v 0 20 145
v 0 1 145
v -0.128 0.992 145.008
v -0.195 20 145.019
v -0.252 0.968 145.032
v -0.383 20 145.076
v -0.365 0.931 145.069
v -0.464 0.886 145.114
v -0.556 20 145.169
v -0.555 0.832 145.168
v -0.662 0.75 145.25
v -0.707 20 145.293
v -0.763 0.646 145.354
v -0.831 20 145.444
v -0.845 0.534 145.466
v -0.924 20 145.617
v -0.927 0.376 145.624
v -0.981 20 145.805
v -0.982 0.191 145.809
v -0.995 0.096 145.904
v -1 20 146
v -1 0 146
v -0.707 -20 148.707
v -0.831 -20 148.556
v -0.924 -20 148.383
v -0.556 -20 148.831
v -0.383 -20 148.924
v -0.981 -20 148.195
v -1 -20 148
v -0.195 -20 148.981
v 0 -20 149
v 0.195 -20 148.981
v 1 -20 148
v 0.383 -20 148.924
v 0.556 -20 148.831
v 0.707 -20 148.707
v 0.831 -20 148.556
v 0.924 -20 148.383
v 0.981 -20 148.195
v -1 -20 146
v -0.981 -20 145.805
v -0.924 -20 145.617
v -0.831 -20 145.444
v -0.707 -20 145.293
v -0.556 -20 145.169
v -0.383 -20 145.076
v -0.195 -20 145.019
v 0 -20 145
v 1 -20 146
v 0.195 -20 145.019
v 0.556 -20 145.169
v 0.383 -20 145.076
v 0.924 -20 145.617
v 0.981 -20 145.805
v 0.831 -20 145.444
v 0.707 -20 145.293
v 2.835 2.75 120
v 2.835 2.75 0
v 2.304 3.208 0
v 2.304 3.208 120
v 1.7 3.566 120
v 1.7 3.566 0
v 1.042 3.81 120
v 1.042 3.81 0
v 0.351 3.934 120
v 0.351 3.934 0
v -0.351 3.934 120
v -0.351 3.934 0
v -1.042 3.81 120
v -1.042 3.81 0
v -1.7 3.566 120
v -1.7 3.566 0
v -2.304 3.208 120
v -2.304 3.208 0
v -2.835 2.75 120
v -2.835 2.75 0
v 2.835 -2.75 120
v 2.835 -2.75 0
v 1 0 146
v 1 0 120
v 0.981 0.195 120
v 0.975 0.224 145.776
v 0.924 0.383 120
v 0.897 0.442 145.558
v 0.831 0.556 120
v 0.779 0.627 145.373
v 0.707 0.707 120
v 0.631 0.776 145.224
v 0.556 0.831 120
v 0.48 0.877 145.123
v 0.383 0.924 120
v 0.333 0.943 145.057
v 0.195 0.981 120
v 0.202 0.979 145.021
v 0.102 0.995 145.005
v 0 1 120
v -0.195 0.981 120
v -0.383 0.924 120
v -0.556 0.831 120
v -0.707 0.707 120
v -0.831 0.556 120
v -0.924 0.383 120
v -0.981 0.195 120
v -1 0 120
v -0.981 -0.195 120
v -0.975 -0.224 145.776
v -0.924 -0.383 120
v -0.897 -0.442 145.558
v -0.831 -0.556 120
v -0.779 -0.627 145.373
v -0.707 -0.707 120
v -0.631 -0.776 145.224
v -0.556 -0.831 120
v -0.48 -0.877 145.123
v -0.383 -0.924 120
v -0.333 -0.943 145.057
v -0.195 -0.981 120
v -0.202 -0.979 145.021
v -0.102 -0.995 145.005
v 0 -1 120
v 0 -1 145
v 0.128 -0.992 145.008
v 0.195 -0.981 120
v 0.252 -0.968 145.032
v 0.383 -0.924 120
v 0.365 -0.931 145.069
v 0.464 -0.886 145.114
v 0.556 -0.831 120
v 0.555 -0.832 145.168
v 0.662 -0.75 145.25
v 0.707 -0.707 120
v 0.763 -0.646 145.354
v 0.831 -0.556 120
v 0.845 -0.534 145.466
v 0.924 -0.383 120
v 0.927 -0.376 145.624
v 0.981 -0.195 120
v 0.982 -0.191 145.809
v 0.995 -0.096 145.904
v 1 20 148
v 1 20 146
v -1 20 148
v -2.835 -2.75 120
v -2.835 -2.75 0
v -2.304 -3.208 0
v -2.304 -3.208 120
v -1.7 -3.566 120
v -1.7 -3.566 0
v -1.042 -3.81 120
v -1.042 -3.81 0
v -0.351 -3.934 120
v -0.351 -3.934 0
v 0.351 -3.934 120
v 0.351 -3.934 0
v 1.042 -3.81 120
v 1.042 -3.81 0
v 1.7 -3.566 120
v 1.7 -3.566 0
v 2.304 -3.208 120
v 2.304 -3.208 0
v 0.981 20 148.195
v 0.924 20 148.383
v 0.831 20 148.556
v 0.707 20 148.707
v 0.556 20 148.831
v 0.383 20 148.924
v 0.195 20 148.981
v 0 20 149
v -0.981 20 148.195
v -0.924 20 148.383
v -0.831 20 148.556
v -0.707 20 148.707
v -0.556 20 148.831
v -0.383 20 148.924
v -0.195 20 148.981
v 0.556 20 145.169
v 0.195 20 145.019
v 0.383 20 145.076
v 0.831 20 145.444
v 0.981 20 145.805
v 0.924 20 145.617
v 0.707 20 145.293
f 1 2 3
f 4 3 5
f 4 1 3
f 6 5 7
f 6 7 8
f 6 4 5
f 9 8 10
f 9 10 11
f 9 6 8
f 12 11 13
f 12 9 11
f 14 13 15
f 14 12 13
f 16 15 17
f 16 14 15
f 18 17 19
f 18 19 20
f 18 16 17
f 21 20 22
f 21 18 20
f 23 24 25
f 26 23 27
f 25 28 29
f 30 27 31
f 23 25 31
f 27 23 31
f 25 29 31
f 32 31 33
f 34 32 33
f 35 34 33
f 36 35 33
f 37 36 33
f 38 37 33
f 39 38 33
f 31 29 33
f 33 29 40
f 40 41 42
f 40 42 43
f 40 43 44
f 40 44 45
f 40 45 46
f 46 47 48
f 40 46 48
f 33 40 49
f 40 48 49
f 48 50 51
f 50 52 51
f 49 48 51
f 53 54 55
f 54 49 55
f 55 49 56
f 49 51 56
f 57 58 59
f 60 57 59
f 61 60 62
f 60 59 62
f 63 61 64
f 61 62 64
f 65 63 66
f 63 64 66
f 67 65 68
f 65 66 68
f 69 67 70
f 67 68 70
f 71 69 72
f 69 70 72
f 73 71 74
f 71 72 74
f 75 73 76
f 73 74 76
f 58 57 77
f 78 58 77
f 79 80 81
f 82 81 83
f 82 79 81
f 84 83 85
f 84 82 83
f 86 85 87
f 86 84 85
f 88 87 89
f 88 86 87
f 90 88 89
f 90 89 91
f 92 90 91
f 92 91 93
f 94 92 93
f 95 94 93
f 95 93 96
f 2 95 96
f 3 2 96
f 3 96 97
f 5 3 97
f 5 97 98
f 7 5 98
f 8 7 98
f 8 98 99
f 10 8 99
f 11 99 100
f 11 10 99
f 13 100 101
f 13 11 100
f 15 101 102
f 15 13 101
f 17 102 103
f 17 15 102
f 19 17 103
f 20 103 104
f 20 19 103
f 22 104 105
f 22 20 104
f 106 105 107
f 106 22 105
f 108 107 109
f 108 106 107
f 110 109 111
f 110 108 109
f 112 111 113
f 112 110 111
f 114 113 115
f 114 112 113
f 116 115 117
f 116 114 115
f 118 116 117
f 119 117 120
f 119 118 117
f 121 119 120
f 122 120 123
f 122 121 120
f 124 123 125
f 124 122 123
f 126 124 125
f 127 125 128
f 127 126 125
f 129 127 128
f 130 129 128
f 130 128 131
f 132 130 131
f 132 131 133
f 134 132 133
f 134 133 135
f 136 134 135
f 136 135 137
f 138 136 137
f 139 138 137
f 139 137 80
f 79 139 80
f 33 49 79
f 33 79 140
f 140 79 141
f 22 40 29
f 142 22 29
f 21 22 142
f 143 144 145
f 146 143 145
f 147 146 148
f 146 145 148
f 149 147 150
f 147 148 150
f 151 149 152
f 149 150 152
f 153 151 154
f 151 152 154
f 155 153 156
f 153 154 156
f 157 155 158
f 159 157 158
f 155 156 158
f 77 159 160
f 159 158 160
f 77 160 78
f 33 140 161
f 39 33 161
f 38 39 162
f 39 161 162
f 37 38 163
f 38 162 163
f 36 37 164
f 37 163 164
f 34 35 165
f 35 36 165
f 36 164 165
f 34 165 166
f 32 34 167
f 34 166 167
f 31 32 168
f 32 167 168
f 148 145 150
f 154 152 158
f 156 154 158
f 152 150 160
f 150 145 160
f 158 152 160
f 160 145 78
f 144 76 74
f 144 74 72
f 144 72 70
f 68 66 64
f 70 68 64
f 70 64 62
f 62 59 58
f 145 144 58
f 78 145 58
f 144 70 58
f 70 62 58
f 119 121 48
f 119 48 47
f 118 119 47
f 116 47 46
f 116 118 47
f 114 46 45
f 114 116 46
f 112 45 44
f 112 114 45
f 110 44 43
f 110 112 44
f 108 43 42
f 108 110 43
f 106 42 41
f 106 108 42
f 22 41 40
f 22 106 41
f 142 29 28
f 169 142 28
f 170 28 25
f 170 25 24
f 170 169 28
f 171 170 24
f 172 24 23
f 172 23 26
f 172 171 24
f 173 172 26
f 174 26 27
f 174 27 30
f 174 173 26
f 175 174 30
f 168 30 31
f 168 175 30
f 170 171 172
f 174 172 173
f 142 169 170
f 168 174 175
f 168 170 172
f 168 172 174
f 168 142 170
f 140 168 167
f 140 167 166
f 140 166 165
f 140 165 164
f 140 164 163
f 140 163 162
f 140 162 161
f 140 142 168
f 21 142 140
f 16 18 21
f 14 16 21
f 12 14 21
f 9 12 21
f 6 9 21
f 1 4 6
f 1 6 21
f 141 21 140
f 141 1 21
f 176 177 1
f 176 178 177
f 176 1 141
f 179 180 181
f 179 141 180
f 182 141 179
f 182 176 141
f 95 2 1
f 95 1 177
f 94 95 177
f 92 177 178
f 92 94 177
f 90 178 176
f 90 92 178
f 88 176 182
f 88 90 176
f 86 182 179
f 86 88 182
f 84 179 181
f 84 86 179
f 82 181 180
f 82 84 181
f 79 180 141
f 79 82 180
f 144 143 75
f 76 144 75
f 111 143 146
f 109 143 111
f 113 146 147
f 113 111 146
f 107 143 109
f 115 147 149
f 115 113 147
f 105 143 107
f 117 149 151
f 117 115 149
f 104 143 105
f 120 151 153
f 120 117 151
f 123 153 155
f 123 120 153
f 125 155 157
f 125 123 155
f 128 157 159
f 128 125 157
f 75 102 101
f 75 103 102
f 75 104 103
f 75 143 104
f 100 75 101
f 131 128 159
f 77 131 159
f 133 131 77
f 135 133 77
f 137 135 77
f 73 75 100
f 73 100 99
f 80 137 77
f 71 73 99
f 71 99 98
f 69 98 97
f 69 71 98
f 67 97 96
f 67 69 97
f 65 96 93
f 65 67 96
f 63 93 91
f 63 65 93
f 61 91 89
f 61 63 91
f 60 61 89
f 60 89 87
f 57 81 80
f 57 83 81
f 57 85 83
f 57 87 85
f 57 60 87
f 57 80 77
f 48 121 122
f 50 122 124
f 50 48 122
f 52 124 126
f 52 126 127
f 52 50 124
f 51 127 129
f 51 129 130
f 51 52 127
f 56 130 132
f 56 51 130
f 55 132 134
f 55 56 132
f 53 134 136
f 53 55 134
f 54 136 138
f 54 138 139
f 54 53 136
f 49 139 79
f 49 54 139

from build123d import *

# Parameters (mm, degrees)
F0_R         = 3.95
F1_DEPTH     = 120
F3_DEPTH     = 120.001
F4_R         = 1
F5_DEPTH     = 25
F6_W         = 2
F6_H         = 40
F7_DEPTH     = 4
F8_T1_DEPTH  = 45
F8_T6_DEPTH  = 22.5
F8_S7_R      = 1
F8_T8_DEPTH  = 13
F8_T12_DEPTH = 22.5
F8_S13_R     = 1
F8_T14_DEPTH = 13
F8_T18_DEPTH = 22.5
F8_S19_R     = 1
F8_T20_DEPTH = 13
F8_T24_DEPTH = 22.5
F8_S25_R     = 1
F8_T26_DEPTH = 13


# Not quite as in the source:
# - a fillet or chamfer that OpenCascade refuses, or shapes differently, is made with other operations: its cross-section is extruded or revolved along the edge and cut away or added


with BuildPart() as f1:
    # F0 (on Top) → F1 (new body)
    with BuildSketch(Plane.XY):
        Circle(F0_R)
    extrude(amount=F1_DEPTH)

    # F2 (on face) → F3 (cut, through all)
    with BuildSketch(Plane.XY.offset(120)):
        with BuildLine():
            Line((-2.8354893758, -2.75), (-2.8354893758, 2.75))
            ThreePointArc((-2.8354893758, 2.75), (-3.95, 0), (-2.8354893758, -2.75))
        make_face()
        with BuildLine():
            ThreePointArc((3.95, 0), (3.6607842762, 1.4836301705), (2.8354893758, 2.75))
            Line((2.8354893758, 2.75), (2.8354893758, -2.75))
            ThreePointArc((2.8354893758, -2.75), (3.6607842762, -1.4836301705), (3.95, 0))
        make_face()
    extrude(amount=-F3_DEPTH, mode=Mode.SUBTRACT)

    # F4 (on face) → F5 (join)
    with BuildSketch(Plane.XY.offset(120)):
        Circle(F4_R)
    extrude(amount=F5_DEPTH)

    # F6 (on face) → F7 (join)
    with BuildSketch(Plane.XY.offset(145)):
        Rectangle(F6_W, F6_H)
    extrude(amount=F7_DEPTH)

    # F8: fillet of radius 1 on 6 edges, made by hand

    # F8_s2 → F8_t1 (cut)
    with BuildSketch(Plane.XZ.offset(-22.5)):
        with BuildLine():
            ThreePointArc((1, 148), (0.7071067812, 148.7071067812), (0, 149))
            Line((0, 149), (1, 149))
            Line((1, 149), (1, 148))
        make_face()
        with BuildLine():
            ThreePointArc((-1, 148), (-0.7071067812, 148.7071067812), (0, 149))
            Line((0, 149), (-1, 149))
            Line((-1, 149), (-1, 148))
        make_face()
    extrude(amount=F8_T1_DEPTH, mode=Mode.SUBTRACT)


with BuildPart() as f8_tool4:
    # F8_s5 → F8_t6 (new body)
    with BuildSketch(Plane.XZ.offset(22.5)):
        with BuildLine():
            ThreePointArc((0, 145), (0.7071067812, 145.2928932188), (1, 146))
            Line((1, 146), (1, 145))
            Line((1, 145), (0, 145))
        make_face()
    extrude(amount=-F8_T6_DEPTH)

    # F8_s7 → F8_t8 (cut, symmetric)
    with BuildSketch(Plane.XY.offset(145.5)):
        Circle(F8_S7_R)
    extrude(amount=F8_T8_DEPTH, both=True, mode=Mode.SUBTRACT)


with BuildPart() as f1_1:
    add(f1.part)

    # F8_t3: cut F8_tool4
    add(f8_tool4.part, mode=Mode.SUBTRACT)


with BuildPart() as f8_tool10:
    # F8_s11 → F8_t12 (new body)
    with BuildSketch(Plane.XZ):
        with BuildLine():
            ThreePointArc((0, 145), (-0.7071067812, 145.2928932188), (-1, 146))
            Line((-1, 146), (-1, 145))
            Line((-1, 145), (0, 145))
        make_face()
    extrude(amount=F8_T12_DEPTH)

    # F8_s13 → F8_t14 (cut, symmetric)
    with BuildSketch(Plane.XY.offset(145.5)):
        Circle(F8_S13_R)
    extrude(amount=F8_T14_DEPTH, both=True, mode=Mode.SUBTRACT)


with BuildPart() as f1_2:
    add(f1_1.part)

    # F8_t9: cut F8_tool10
    add(f8_tool10.part, mode=Mode.SUBTRACT)


with BuildPart() as f8_tool16:
    # F8_s17 → F8_t18 (new body)
    with BuildSketch(Plane.XZ.offset(-22.5)):
        with BuildLine():
            ThreePointArc((0, 145), (-0.7071067812, 145.2928932188), (-1, 146))
            Line((-1, 146), (-1, 145))
            Line((-1, 145), (0, 145))
        make_face()
    extrude(amount=F8_T18_DEPTH)

    # F8_s19 → F8_t20 (cut, symmetric)
    with BuildSketch(Plane.XY.offset(145.5)):
        Circle(F8_S19_R)
    extrude(amount=F8_T20_DEPTH, both=True, mode=Mode.SUBTRACT)


with BuildPart() as f1_3:
    add(f1_2.part)

    # F8_t15: cut F8_tool16
    add(f8_tool16.part, mode=Mode.SUBTRACT)


with BuildPart() as f8_tool22:
    # F8_s23 → F8_t24 (new body)
    with BuildSketch(Plane.XZ):
        with BuildLine():
            ThreePointArc((0, 145), (0.7071067812, 145.2928932188), (1, 146))
            Line((1, 146), (1, 145))
            Line((1, 145), (0, 145))
        make_face()
    extrude(amount=-F8_T24_DEPTH)

    # F8_s25 → F8_t26 (cut, symmetric)
    with BuildSketch(Plane.XY.offset(145.5)):
        Circle(F8_S25_R)
    extrude(amount=F8_T26_DEPTH, both=True, mode=Mode.SUBTRACT)


with BuildPart() as f1_4:
    add(f1_3.part)

    # F8_t21: cut F8_tool22
    add(f8_tool22.part, mode=Mode.SUBTRACT)


solid = f1_4.part
